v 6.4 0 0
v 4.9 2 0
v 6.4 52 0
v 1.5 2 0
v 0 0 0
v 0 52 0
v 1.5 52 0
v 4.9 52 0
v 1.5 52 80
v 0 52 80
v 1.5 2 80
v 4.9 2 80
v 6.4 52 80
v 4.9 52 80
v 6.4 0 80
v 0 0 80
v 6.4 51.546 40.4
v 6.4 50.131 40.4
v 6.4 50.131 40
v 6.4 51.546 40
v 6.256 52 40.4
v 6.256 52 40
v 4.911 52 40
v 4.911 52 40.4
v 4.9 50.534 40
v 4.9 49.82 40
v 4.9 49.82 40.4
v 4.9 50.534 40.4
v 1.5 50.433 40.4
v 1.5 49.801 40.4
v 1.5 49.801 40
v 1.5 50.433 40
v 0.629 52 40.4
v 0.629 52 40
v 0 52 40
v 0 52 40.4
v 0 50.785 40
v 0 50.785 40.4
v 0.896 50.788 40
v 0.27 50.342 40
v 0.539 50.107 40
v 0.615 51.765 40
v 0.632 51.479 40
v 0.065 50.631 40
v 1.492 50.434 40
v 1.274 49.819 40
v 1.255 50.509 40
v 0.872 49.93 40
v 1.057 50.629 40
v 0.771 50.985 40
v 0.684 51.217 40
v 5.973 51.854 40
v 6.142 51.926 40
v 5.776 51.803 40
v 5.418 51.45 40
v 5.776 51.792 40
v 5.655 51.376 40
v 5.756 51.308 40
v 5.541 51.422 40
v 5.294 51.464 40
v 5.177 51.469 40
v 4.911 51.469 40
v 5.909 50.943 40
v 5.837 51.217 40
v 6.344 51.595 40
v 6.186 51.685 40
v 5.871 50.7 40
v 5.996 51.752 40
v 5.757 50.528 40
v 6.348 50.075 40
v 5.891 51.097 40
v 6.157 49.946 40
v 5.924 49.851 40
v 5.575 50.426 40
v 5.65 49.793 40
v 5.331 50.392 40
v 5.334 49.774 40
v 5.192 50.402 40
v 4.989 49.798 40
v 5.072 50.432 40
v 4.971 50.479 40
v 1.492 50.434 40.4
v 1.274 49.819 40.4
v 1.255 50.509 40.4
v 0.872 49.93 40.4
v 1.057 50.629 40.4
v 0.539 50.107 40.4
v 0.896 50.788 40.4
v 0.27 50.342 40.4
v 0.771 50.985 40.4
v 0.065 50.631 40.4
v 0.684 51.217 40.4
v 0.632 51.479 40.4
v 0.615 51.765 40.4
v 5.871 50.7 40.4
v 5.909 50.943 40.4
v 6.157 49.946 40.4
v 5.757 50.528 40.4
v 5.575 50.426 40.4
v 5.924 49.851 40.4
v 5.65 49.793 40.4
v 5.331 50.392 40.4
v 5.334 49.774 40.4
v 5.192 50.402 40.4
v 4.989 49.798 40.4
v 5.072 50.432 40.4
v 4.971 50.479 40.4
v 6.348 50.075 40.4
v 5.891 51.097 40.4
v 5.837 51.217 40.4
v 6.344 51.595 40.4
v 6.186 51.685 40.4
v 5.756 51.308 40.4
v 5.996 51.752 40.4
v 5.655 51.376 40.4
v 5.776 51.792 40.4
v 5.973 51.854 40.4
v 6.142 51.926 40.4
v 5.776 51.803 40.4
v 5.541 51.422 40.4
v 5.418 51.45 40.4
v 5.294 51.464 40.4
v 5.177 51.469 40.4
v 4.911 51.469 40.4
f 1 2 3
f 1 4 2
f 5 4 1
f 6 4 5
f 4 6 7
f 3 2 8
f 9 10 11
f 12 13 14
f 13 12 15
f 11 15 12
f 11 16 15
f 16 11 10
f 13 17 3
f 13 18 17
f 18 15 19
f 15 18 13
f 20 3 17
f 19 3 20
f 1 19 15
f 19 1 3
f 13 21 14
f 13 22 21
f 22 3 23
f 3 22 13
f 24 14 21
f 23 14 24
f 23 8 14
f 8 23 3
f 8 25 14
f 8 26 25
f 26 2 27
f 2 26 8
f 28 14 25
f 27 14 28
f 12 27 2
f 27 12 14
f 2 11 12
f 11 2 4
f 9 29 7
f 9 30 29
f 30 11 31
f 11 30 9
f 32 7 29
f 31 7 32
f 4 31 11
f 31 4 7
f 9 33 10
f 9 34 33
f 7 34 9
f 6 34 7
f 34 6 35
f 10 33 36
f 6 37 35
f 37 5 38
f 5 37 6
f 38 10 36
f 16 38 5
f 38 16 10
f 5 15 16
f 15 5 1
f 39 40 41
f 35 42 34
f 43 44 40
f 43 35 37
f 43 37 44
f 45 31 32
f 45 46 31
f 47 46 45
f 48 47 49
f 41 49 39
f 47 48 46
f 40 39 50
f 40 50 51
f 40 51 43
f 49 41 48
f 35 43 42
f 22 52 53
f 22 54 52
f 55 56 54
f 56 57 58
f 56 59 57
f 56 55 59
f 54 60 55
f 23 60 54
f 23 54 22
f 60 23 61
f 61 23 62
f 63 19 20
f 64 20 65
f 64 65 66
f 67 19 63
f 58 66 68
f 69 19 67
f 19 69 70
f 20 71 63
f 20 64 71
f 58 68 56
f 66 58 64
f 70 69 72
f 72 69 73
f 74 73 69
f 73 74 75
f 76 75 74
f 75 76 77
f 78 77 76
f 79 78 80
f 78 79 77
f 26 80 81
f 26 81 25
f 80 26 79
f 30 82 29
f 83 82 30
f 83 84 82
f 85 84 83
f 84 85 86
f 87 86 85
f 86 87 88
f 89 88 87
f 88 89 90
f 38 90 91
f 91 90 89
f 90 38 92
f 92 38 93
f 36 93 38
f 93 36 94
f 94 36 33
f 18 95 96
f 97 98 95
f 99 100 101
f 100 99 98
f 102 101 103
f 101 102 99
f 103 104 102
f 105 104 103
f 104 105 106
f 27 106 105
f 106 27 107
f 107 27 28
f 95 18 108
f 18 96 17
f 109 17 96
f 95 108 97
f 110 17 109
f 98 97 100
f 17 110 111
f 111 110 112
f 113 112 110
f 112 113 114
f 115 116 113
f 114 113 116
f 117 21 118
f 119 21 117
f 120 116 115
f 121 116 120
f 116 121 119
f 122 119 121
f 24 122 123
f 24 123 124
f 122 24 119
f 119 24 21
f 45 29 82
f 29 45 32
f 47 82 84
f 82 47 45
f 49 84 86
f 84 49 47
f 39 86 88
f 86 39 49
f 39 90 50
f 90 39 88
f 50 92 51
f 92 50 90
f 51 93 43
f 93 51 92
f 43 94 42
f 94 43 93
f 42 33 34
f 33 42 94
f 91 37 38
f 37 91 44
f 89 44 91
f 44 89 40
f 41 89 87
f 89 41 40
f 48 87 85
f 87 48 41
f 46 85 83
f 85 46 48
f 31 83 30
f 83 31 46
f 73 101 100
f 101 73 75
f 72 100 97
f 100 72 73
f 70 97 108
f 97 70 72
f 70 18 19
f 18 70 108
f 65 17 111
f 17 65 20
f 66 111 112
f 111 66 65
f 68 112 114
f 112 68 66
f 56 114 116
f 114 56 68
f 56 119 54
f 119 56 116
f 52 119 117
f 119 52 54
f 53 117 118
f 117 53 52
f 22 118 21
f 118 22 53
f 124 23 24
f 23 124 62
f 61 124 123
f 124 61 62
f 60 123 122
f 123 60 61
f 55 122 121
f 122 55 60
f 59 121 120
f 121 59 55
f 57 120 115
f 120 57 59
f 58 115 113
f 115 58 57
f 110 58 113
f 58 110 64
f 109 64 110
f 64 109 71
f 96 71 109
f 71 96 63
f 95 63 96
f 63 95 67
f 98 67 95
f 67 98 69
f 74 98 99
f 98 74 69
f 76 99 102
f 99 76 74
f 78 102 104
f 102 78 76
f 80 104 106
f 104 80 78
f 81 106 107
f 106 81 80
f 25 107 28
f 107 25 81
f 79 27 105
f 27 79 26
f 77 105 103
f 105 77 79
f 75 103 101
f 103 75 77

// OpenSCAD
// =====================================================
// GUIA DE POSIÇÃO — Caixa Plástica Ordene 30L
// Espaçadores no fundo da caixa que posicionam as divisórias
// =====================================================
//
// CONCEITO:
//   MDF 300×300×3mm encaixa justo na caixa (301mm interno).
//   Não precisa de trilhos laterais!
//   Apenas guias no fundo definem a posição Y de cada divisória.
//
//   VISTA LATERAL (corte):
//
//   ├── parede caixa ──┤
//   │                  │
//   │  MDF  MDF  MDF   │  ← divisórias 300×300mm
//   │  │ ║  │ ║  │     │     encaixam justo na largura
//   │  │ ║  │ ║  │     │
//   │  │ ║  │ ║  │     │
//   │  ▼ ║  ▼ ║  ▼     │
//   └──█══█══█══█══────┘  ← guias no fundo
//       ↑    ↑    ↑
//      guias definem posição Y
//
//   PERFIL DA GUIA (seção transversal em Y):
//
//     canal ← MDF 3mm desliza aqui
//   ┌─┐   ┌─┐
//   │ │ ░ │ │  ← paredes 1.5mm
//   │ │   │ │     50mm de altura
//   │ │   │ │     (anti-tombo)
//   │ └───┘ │
//   └───────┘  ← base 2mm (cola no fundo da caixa)
//
//   BARRA ANTI-TOMBO (repousa no aro da caixa):
//
//   ┌─────────■───────■──────────■───────┐
//   │        G3      GM       WEGA       │  ← rasgos para MDF
//   └────────────────────────────────────┘
//   Seção 1: G3+GM+Wega (135mm)  |  Seção 2: HEPA+C1+C2 (125mm)
//   2 seções × 2 lados = 4 peças
//
// =====================================================

// ═══ PARÂMETROS DA CAIXA ═══
caixa_int_w = 301;   // largura interna
caixa_int_d = 419;   // profundidade interna
caixa_int_h = 297;   // altura interna
parede_plastico = 3;

// ═══ PARÂMETROS MDF ═══
mdf_w = 300;          // largura MDF (chapa inteira)
mdf_h = 300;          // altura MDF
mdf_esp = 3;          // espessura
folga = 0.4;          // folga canal

// ═══ PARÂMETROS DA GUIA ═══
canal = mdf_esp + folga;     // 3.4mm
parede = 1.5;                // parede do canal
base_w = canal + 2*parede;   // 6.4mm largura total
base_h = 2;                  // altura da base (superfície de colagem)
guia_alt = 50;               // altura das paredes guia (anti-tombo)
guia_comp = 80;              // comprimento da guia (transversal à caixa)

// Comprimento cabe dentro da caixa (fundo, um de cada lado)
// 2 guias por posição: uma no fundo-esquerda, outra no fundo-direita

echo(str("=== GUIA DE POSIÇÃO + BARRA ANTI-TOMBO ==="));
echo(str("Guia piso: canal ", canal, "mm | ", base_w, "×", guia_comp, "×", guia_alt+base_h, "mm"));
echo(str("Barra topo: ", barra_larg, "×", barra_alt, "mm | S1=", barra1_comp, "mm | S2=", barra2_comp, "mm"));
echo(str("MDF 300×300 encaixa justo em 301mm (folga 0.5mm/lado)"));

// ═══ POSIÇÕES DAS DIVISÓRIAS (Y desde parede frontal) ═══
pos_manta_g3  = 50;
pos_gm_cabine = 95;
pos_wega      = 165;
pos_hepa      = 245;
pos_tela1     = 310;
pos_tela2     = 350;

posicoes = [pos_manta_g3, pos_gm_cabine, pos_wega, pos_hepa, pos_tela1, pos_tela2];
nomes = ["G3", "GM", "WEGA", "HEPA", "C1", "C2"];

// =====================================================
// MÓDULOS
// =====================================================

module guia_perfil() {
    // Perfil em U (seção transversal)
    // Base
    square([base_w, base_h]);
    // Parede esquerda
    translate([0, base_h])
        square([parede, guia_alt]);
    // Parede direita
    translate([parede + canal, base_h])
        square([parede, guia_alt]);
}

module guia_piso(comp = guia_comp, nome = "") {
    // Guia completa para colar no fundo da caixa
    difference() {
        linear_extrude(comp)
            guia_perfil();
        
        // Gravação do nome (se fornecido)
        if (nome != "") {
            translate([base_w/2, base_h + guia_alt - 0.3, comp/2])
                rotate([0, 0, 0])
                    linear_extrude(0.4)
                        text(nome, size = 4, halign = "center", valign = "center",
                             font = "Liberation Sans:style=Bold");
        }
    }
}

module guia_dupla(comp = guia_comp, nome = "") {
    // Par de guias para 1 posição (esq + dir, espelhadas no fundo da caixa)
    guia_piso(comp, nome);
    // A segunda guia fica do outro lado do fundo
    // (distância = largura interna da caixa - comprimento guia)
    translate([0, 0, caixa_int_w - comp])
        guia_piso(comp, nome);
}

// =====================================================
// BARRA ANTI-TOMBO (topo da caixa)
// =====================================================
// Impede que as divisórias tombem para frente/trás.
// Repousa sobre o aro da caixa, com rasgos nos pontos
// de cada divisória. 2 seções (cabem na impressora) × 2 lados = 4 peças.

barra_larg    = 15;     // largura (assenta no aro da caixa)
barra_alt     = 20;     // altura da barra
barra_encaixe = 14;     // profundidade do rasgo (MDF entra por baixo)

// Seção 1: G3(50) + GM(95) + Wega(165) → Y=40..175 = 135mm
// Seção 2: HEPA(245) + C1(310) + C2(350) → Y=235..360 = 125mm
barra1_ini = 40;   barra1_comp = 135;
barra2_ini = 235;  barra2_comp = 125;

barra1_rasgos = [pos_manta_g3  - barra1_ini,
                 pos_gm_cabine - barra1_ini,
                 pos_wega      - barra1_ini];

barra2_rasgos = [pos_hepa  - barra2_ini,
                 pos_tela1 - barra2_ini,
                 pos_tela2 - barra2_ini];

module barra_topo(comp, rasgos, nome="") {
    difference() {
        cube([comp, barra_larg, barra_alt]);
        // Rasgos (de baixo para cima) — MDF entra por baixo
        for (p = rasgos) {
            translate([p - canal/2, -0.1, -0.1])
                cube([canal, barra_larg + 0.2, barra_encaixe + 0.1]);
        }
        // Gravação do nome
        if (nome != "") {
            translate([comp/2, barra_larg/2, barra_alt - 0.3])
                linear_extrude(0.4)
                    text(nome, size=5, halign="center", valign="center",
                         font="Liberation Sans:style=Bold");
        }
    }
}

module batch_barras() {
    // 4 peças: seção1 esq, seção1 dir, seção2 esq, seção2 dir
    esp = 3;
    barra_topo(barra1_comp, barra1_rasgos, "S1-E");
    translate([0, barra_larg + esp, 0])
        barra_topo(barra1_comp, barra1_rasgos, "S1-D");
    translate([0, (barra_larg + esp) * 2, 0])
        barra_topo(barra2_comp, barra2_rasgos, "S2-E");
    translate([0, (barra_larg + esp) * 3, 0])
        barra_topo(barra2_comp, barra2_rasgos, "S2-D");
}

// =====================================================
// LAYOUT DE IMPRESSÃO
// =====================================================

module batch_todas_guias() {
    // 6 posições × 2 guias = 12 peças
    // Cada peça: 6.4 × 80 × 52mm (base 2 + guia 50)
    // Para barras anti-tombo ver: batch_barras()
    
    espaco = 3;
    for (i = [0 : len(posicoes) - 1]) {
        // Guia esquerda
        translate([(base_w + espaco) * (i * 2), 0, 0])
            guia_piso(guia_comp, str(nomes[i], "E"));
        // Guia direita
        translate([(base_w + espaco) * (i * 2 + 1), 0, 0])
            guia_piso(guia_comp, str(nomes[i], "D"));
    }
}

// =====================================================
// RENDERIZAÇÃO
// =====================================================

// Visualizar uma guia (50mm anti-tombo)
guia_piso(guia_comp, "G3");

// Descomentar para ver layout de guias piso:
// batch_todas_guias();

// Descomentar para ver layout de barras anti-tombo:
// batch_barras();

// Descomentar para ver uma barra seção 1:
// barra_topo(barra1_comp, barra1_rasgos, "S1");

// Descomentar para ver perfil 2D:
// guia_perfil();

// =====================================================
// INSTRUÇÕES DE USO
// =====================================================
//
// 1. Imprimir 12 guias de piso (batch_todas_guias)
//    + 4 barras anti-tombo (batch_barras)
//    ~1h30 total, ~40g PLA
//
// 2. Marcar posições no fundo da caixa com régua:
//    Y=50 (G3), 95 (GM), 165 (Wega), 245 (HEPA), 310 (C1), 350 (C2)
//
// 3. Colar guias piso (50mm alt.) com Super Bonder gel:
//    - 1 guia esq + 1 dir por posição (12 total)
//    - Canal alinhado com a marca
//    - MDF desliza de cima para baixo no canal
//
// 4. Encaixar barras anti-tombo no aro (topo) da caixa:
//    - 2 barras lado esquerdo + 2 lado direito (4 total)
//    - Rasgos alinham com o topo de cada divisória
//    - Impedem o MDF de tombar para frente/trás
//
// 5. MDF 300×300mm encaixa justo na largura (301mm interno)
//    Guias piso (embaixo) + barras topo (em cima) = MDF firme!
//
// SEM FUROS NA CAIXA! Só cola nas guias de piso.
// =====================================================
